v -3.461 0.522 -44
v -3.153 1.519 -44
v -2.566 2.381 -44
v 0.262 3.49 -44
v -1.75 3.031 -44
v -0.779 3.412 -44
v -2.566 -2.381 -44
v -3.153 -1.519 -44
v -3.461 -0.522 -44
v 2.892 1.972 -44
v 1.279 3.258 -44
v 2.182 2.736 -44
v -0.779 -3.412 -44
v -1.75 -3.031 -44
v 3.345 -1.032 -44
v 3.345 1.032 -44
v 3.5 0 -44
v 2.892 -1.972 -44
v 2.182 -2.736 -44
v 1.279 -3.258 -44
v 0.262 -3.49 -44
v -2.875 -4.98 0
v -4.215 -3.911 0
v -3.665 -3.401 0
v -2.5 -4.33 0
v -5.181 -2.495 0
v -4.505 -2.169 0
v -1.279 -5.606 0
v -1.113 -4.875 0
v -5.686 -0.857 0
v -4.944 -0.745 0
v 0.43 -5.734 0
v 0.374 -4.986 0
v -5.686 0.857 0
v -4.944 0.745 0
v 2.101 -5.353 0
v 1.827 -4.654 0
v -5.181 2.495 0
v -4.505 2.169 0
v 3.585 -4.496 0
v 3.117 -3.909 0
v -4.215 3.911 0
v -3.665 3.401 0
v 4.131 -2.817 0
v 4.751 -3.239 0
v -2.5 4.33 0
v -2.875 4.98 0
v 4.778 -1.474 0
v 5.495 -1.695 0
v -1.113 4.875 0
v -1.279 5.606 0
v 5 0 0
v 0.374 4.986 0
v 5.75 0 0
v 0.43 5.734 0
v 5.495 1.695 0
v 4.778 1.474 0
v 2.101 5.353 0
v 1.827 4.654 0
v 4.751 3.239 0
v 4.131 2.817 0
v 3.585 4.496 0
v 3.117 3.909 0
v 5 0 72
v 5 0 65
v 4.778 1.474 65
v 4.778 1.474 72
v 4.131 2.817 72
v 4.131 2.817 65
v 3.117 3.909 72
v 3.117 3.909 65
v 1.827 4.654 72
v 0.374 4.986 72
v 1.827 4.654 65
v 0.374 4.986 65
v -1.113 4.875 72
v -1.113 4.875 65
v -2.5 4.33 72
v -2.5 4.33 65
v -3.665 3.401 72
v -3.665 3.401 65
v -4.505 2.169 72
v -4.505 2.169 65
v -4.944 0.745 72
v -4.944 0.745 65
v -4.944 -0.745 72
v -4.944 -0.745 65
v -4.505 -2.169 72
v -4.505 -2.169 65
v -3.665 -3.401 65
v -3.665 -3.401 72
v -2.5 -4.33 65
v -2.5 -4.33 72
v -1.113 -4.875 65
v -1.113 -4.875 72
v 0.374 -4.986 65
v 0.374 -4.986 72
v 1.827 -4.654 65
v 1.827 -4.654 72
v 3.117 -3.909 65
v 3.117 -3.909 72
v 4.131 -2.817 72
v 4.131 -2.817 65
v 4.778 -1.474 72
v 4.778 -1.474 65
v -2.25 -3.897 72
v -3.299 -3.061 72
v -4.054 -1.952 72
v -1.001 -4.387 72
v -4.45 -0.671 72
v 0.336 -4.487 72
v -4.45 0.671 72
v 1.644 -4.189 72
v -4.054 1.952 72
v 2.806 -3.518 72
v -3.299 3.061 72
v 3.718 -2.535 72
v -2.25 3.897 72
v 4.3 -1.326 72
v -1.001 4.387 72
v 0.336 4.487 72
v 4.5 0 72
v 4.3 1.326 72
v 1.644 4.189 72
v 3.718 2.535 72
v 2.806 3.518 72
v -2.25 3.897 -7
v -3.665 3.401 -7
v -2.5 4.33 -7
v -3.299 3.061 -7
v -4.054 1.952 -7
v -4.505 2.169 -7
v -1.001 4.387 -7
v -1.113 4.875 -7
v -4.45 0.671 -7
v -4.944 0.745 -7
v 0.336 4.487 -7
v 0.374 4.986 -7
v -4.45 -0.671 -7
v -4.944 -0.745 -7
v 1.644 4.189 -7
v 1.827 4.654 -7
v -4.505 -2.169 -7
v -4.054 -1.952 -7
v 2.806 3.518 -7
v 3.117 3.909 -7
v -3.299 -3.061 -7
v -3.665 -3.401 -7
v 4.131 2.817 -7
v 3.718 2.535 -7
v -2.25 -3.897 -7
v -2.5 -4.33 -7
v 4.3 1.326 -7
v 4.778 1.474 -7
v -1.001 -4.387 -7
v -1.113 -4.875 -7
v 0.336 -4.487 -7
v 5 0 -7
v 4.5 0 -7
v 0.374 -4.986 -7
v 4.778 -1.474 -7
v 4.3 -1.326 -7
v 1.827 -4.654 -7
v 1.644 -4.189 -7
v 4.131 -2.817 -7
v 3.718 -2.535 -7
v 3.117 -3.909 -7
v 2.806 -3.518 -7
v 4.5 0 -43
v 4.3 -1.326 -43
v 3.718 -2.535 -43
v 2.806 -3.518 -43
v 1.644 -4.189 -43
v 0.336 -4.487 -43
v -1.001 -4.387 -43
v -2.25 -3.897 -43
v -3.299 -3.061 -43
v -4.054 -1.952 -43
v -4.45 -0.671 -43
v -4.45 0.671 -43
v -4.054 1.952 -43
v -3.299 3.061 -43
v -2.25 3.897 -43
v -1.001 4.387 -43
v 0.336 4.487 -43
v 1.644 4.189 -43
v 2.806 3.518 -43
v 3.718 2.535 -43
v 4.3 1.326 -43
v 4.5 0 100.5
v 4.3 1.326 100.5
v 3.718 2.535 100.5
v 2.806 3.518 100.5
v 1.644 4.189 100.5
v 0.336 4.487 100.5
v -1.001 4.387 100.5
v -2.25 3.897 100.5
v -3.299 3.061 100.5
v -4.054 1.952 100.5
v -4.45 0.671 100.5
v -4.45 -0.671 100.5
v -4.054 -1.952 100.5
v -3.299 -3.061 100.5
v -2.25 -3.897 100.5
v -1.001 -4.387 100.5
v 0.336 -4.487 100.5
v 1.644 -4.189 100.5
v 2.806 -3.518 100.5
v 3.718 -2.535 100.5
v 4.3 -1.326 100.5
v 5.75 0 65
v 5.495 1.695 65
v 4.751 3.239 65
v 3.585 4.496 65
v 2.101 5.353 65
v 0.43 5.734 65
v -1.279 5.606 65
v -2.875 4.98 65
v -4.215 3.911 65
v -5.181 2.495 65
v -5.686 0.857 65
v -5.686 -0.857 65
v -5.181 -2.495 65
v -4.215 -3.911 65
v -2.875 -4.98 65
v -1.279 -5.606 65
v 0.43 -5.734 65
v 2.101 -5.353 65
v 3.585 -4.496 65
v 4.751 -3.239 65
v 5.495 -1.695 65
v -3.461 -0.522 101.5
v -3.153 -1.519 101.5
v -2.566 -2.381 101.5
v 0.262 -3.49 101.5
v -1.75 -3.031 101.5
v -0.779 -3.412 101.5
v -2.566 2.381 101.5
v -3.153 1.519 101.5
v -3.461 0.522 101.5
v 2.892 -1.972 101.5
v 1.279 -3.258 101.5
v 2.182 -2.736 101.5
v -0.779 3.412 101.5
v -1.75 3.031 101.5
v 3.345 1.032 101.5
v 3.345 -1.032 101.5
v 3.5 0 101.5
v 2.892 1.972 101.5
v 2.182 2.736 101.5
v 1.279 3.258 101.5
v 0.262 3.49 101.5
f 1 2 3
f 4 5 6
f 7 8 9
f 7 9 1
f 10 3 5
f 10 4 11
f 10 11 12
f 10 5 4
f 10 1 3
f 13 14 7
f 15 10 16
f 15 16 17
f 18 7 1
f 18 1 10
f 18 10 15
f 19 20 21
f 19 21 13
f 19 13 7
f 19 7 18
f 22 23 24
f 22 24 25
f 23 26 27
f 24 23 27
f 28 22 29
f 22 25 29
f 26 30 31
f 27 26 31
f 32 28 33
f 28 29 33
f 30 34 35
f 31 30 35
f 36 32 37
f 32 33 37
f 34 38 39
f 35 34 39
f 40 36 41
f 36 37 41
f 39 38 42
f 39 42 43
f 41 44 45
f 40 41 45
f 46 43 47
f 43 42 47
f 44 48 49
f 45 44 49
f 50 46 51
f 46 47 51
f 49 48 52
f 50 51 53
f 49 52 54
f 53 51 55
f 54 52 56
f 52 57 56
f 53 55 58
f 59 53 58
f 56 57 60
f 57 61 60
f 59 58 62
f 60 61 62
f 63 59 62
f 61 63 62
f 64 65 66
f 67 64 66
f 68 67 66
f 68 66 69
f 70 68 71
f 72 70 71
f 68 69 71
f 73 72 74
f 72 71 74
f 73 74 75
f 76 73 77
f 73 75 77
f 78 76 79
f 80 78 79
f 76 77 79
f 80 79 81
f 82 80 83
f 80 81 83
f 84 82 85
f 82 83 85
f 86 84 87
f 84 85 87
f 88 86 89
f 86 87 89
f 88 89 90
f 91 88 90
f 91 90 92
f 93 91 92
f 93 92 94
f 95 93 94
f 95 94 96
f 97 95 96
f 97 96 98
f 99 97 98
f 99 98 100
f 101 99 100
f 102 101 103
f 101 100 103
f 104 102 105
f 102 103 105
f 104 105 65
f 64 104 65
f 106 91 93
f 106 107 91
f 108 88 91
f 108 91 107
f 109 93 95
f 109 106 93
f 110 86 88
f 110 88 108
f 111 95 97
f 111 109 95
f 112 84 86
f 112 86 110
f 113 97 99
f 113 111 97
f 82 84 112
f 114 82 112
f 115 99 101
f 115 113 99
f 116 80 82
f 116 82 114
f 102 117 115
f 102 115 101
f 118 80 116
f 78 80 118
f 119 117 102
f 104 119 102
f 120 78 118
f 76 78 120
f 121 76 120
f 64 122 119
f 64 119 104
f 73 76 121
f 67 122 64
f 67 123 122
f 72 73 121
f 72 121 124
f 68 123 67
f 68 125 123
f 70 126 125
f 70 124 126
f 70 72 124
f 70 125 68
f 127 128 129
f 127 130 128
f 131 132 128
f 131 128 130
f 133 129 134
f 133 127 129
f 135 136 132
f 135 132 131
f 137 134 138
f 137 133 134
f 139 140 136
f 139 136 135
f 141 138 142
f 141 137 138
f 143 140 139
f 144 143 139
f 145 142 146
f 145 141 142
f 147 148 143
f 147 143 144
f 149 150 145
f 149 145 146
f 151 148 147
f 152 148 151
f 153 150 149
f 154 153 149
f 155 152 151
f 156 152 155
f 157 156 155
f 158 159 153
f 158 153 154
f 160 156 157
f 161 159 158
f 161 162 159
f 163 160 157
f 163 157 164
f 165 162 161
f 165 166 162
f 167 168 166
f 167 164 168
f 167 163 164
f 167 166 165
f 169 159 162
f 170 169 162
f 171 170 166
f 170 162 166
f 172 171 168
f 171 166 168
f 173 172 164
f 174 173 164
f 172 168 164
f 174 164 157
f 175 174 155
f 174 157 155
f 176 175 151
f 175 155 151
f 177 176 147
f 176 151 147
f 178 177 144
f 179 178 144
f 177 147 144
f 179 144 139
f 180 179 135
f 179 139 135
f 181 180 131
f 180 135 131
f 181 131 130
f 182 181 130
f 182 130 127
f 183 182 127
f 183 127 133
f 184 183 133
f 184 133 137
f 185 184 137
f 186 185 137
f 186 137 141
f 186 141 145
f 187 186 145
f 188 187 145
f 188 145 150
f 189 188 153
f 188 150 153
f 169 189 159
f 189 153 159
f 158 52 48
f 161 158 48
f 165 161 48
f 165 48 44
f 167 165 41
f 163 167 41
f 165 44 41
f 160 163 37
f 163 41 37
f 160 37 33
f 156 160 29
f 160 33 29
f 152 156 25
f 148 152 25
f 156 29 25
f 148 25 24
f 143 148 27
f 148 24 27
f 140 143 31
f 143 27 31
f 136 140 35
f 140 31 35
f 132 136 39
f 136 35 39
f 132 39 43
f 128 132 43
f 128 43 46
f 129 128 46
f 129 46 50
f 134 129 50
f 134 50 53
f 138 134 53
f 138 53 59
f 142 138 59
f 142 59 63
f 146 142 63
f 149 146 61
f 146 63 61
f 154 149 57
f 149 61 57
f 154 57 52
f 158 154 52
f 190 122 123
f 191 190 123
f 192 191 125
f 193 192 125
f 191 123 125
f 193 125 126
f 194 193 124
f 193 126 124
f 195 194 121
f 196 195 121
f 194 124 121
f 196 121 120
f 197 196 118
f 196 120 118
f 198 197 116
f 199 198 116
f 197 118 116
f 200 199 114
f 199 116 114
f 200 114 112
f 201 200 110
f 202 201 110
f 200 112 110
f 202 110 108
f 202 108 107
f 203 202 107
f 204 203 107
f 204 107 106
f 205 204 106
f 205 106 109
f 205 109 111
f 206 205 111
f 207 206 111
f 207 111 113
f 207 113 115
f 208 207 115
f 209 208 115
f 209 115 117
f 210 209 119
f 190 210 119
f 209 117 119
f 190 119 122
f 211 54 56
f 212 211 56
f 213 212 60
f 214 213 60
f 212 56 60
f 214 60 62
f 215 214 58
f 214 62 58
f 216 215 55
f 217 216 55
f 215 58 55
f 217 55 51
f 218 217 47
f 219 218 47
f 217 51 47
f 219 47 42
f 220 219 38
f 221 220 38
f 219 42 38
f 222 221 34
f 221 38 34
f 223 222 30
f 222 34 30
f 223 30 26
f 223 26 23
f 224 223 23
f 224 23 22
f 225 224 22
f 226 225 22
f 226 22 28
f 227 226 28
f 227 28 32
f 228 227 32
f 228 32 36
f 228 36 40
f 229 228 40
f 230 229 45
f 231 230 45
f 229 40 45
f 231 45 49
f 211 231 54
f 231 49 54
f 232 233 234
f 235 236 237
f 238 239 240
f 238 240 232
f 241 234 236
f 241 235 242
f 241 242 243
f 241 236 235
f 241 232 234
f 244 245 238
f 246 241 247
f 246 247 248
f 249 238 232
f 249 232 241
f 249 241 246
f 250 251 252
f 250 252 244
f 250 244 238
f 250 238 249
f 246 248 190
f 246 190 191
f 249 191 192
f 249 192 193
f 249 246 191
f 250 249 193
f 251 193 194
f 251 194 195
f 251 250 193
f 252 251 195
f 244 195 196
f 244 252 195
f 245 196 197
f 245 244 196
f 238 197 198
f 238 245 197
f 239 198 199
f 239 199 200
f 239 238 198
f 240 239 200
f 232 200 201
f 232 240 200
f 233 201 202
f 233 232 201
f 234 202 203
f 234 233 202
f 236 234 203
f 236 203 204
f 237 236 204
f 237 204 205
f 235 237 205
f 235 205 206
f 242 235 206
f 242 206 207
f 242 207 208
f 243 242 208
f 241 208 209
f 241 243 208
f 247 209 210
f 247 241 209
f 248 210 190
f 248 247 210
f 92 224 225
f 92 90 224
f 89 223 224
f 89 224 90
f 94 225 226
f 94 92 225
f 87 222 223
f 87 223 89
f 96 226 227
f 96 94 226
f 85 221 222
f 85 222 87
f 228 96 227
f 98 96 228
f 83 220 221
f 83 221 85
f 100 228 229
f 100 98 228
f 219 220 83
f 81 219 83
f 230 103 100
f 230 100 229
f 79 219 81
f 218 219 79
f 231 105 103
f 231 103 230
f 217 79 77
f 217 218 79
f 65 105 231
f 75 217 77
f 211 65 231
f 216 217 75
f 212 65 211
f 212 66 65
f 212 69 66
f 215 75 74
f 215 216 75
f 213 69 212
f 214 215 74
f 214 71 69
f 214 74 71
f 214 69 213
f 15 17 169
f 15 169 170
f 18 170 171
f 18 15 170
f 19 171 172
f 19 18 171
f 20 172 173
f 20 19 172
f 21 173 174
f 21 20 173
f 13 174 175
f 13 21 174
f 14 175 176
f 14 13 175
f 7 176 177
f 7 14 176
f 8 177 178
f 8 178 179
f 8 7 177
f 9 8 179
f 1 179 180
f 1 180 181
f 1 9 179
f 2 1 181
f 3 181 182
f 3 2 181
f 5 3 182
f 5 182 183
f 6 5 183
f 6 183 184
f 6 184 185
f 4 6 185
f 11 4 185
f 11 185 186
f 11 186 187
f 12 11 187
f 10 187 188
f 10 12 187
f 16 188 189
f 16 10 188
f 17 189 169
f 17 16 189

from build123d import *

# Parameters (mm, degrees)
SKETCH_R     = 5.75
PAD_DEPTH    = 65
SKETCH001_R  = 5
PAD001_DEPTH = 7
SKETCH002_R  = 4.5
PAD002_DEPTH = 29.5
SKETCH003_R  = 5
PAD003_DEPTH = 7
SKETCH004_R  = 4.5
PAD004_DEPTH = 37
CHAMFER_SIZE = 1


with BuildPart() as part:
    # Sketch → Pad (new body)
    with BuildSketch(Plane.XY):
        Circle(SKETCH_R)
    extrude(amount=PAD_DEPTH)

    # Sketch001 (on Face3 of Pad) → Pad001 (join)
    with BuildSketch(Plane.XY.offset(65)):
        Circle(SKETCH001_R)
    extrude(amount=PAD001_DEPTH)

    # Sketch002 (on Face5 of Pad001) → Pad002 (join)
    with BuildSketch(Plane.XY.offset(72)):
        Circle(SKETCH002_R)
    extrude(amount=PAD002_DEPTH)

    # Sketch003 (on Face2 of Pad002) → Pad003 (join)
    with BuildSketch(Plane(origin=(0, 0, 0), x_dir=(1, 0, 0), z_dir=(0, 0, -1))):
        Circle(SKETCH003_R)
    extrude(amount=PAD003_DEPTH)

    # Sketch004 (on Face6 of Pad003) → Pad004 (join)
    with BuildSketch(Plane(origin=(0, 0, -7), x_dir=(1, 0, 0), z_dir=(0, 0, -1))):
        Circle(SKETCH004_R)
    extrude(amount=PAD004_DEPTH)

    # Chamfer
    chamfer_edges = [part.edges().sort_by_distance(p)[0] for p in [
        (-4.5, 0, -44),
        (-4.5, 0, 101.5),
    ]]
    chamfer(chamfer_edges, length=CHAMFER_SIZE)


solid = part.part
